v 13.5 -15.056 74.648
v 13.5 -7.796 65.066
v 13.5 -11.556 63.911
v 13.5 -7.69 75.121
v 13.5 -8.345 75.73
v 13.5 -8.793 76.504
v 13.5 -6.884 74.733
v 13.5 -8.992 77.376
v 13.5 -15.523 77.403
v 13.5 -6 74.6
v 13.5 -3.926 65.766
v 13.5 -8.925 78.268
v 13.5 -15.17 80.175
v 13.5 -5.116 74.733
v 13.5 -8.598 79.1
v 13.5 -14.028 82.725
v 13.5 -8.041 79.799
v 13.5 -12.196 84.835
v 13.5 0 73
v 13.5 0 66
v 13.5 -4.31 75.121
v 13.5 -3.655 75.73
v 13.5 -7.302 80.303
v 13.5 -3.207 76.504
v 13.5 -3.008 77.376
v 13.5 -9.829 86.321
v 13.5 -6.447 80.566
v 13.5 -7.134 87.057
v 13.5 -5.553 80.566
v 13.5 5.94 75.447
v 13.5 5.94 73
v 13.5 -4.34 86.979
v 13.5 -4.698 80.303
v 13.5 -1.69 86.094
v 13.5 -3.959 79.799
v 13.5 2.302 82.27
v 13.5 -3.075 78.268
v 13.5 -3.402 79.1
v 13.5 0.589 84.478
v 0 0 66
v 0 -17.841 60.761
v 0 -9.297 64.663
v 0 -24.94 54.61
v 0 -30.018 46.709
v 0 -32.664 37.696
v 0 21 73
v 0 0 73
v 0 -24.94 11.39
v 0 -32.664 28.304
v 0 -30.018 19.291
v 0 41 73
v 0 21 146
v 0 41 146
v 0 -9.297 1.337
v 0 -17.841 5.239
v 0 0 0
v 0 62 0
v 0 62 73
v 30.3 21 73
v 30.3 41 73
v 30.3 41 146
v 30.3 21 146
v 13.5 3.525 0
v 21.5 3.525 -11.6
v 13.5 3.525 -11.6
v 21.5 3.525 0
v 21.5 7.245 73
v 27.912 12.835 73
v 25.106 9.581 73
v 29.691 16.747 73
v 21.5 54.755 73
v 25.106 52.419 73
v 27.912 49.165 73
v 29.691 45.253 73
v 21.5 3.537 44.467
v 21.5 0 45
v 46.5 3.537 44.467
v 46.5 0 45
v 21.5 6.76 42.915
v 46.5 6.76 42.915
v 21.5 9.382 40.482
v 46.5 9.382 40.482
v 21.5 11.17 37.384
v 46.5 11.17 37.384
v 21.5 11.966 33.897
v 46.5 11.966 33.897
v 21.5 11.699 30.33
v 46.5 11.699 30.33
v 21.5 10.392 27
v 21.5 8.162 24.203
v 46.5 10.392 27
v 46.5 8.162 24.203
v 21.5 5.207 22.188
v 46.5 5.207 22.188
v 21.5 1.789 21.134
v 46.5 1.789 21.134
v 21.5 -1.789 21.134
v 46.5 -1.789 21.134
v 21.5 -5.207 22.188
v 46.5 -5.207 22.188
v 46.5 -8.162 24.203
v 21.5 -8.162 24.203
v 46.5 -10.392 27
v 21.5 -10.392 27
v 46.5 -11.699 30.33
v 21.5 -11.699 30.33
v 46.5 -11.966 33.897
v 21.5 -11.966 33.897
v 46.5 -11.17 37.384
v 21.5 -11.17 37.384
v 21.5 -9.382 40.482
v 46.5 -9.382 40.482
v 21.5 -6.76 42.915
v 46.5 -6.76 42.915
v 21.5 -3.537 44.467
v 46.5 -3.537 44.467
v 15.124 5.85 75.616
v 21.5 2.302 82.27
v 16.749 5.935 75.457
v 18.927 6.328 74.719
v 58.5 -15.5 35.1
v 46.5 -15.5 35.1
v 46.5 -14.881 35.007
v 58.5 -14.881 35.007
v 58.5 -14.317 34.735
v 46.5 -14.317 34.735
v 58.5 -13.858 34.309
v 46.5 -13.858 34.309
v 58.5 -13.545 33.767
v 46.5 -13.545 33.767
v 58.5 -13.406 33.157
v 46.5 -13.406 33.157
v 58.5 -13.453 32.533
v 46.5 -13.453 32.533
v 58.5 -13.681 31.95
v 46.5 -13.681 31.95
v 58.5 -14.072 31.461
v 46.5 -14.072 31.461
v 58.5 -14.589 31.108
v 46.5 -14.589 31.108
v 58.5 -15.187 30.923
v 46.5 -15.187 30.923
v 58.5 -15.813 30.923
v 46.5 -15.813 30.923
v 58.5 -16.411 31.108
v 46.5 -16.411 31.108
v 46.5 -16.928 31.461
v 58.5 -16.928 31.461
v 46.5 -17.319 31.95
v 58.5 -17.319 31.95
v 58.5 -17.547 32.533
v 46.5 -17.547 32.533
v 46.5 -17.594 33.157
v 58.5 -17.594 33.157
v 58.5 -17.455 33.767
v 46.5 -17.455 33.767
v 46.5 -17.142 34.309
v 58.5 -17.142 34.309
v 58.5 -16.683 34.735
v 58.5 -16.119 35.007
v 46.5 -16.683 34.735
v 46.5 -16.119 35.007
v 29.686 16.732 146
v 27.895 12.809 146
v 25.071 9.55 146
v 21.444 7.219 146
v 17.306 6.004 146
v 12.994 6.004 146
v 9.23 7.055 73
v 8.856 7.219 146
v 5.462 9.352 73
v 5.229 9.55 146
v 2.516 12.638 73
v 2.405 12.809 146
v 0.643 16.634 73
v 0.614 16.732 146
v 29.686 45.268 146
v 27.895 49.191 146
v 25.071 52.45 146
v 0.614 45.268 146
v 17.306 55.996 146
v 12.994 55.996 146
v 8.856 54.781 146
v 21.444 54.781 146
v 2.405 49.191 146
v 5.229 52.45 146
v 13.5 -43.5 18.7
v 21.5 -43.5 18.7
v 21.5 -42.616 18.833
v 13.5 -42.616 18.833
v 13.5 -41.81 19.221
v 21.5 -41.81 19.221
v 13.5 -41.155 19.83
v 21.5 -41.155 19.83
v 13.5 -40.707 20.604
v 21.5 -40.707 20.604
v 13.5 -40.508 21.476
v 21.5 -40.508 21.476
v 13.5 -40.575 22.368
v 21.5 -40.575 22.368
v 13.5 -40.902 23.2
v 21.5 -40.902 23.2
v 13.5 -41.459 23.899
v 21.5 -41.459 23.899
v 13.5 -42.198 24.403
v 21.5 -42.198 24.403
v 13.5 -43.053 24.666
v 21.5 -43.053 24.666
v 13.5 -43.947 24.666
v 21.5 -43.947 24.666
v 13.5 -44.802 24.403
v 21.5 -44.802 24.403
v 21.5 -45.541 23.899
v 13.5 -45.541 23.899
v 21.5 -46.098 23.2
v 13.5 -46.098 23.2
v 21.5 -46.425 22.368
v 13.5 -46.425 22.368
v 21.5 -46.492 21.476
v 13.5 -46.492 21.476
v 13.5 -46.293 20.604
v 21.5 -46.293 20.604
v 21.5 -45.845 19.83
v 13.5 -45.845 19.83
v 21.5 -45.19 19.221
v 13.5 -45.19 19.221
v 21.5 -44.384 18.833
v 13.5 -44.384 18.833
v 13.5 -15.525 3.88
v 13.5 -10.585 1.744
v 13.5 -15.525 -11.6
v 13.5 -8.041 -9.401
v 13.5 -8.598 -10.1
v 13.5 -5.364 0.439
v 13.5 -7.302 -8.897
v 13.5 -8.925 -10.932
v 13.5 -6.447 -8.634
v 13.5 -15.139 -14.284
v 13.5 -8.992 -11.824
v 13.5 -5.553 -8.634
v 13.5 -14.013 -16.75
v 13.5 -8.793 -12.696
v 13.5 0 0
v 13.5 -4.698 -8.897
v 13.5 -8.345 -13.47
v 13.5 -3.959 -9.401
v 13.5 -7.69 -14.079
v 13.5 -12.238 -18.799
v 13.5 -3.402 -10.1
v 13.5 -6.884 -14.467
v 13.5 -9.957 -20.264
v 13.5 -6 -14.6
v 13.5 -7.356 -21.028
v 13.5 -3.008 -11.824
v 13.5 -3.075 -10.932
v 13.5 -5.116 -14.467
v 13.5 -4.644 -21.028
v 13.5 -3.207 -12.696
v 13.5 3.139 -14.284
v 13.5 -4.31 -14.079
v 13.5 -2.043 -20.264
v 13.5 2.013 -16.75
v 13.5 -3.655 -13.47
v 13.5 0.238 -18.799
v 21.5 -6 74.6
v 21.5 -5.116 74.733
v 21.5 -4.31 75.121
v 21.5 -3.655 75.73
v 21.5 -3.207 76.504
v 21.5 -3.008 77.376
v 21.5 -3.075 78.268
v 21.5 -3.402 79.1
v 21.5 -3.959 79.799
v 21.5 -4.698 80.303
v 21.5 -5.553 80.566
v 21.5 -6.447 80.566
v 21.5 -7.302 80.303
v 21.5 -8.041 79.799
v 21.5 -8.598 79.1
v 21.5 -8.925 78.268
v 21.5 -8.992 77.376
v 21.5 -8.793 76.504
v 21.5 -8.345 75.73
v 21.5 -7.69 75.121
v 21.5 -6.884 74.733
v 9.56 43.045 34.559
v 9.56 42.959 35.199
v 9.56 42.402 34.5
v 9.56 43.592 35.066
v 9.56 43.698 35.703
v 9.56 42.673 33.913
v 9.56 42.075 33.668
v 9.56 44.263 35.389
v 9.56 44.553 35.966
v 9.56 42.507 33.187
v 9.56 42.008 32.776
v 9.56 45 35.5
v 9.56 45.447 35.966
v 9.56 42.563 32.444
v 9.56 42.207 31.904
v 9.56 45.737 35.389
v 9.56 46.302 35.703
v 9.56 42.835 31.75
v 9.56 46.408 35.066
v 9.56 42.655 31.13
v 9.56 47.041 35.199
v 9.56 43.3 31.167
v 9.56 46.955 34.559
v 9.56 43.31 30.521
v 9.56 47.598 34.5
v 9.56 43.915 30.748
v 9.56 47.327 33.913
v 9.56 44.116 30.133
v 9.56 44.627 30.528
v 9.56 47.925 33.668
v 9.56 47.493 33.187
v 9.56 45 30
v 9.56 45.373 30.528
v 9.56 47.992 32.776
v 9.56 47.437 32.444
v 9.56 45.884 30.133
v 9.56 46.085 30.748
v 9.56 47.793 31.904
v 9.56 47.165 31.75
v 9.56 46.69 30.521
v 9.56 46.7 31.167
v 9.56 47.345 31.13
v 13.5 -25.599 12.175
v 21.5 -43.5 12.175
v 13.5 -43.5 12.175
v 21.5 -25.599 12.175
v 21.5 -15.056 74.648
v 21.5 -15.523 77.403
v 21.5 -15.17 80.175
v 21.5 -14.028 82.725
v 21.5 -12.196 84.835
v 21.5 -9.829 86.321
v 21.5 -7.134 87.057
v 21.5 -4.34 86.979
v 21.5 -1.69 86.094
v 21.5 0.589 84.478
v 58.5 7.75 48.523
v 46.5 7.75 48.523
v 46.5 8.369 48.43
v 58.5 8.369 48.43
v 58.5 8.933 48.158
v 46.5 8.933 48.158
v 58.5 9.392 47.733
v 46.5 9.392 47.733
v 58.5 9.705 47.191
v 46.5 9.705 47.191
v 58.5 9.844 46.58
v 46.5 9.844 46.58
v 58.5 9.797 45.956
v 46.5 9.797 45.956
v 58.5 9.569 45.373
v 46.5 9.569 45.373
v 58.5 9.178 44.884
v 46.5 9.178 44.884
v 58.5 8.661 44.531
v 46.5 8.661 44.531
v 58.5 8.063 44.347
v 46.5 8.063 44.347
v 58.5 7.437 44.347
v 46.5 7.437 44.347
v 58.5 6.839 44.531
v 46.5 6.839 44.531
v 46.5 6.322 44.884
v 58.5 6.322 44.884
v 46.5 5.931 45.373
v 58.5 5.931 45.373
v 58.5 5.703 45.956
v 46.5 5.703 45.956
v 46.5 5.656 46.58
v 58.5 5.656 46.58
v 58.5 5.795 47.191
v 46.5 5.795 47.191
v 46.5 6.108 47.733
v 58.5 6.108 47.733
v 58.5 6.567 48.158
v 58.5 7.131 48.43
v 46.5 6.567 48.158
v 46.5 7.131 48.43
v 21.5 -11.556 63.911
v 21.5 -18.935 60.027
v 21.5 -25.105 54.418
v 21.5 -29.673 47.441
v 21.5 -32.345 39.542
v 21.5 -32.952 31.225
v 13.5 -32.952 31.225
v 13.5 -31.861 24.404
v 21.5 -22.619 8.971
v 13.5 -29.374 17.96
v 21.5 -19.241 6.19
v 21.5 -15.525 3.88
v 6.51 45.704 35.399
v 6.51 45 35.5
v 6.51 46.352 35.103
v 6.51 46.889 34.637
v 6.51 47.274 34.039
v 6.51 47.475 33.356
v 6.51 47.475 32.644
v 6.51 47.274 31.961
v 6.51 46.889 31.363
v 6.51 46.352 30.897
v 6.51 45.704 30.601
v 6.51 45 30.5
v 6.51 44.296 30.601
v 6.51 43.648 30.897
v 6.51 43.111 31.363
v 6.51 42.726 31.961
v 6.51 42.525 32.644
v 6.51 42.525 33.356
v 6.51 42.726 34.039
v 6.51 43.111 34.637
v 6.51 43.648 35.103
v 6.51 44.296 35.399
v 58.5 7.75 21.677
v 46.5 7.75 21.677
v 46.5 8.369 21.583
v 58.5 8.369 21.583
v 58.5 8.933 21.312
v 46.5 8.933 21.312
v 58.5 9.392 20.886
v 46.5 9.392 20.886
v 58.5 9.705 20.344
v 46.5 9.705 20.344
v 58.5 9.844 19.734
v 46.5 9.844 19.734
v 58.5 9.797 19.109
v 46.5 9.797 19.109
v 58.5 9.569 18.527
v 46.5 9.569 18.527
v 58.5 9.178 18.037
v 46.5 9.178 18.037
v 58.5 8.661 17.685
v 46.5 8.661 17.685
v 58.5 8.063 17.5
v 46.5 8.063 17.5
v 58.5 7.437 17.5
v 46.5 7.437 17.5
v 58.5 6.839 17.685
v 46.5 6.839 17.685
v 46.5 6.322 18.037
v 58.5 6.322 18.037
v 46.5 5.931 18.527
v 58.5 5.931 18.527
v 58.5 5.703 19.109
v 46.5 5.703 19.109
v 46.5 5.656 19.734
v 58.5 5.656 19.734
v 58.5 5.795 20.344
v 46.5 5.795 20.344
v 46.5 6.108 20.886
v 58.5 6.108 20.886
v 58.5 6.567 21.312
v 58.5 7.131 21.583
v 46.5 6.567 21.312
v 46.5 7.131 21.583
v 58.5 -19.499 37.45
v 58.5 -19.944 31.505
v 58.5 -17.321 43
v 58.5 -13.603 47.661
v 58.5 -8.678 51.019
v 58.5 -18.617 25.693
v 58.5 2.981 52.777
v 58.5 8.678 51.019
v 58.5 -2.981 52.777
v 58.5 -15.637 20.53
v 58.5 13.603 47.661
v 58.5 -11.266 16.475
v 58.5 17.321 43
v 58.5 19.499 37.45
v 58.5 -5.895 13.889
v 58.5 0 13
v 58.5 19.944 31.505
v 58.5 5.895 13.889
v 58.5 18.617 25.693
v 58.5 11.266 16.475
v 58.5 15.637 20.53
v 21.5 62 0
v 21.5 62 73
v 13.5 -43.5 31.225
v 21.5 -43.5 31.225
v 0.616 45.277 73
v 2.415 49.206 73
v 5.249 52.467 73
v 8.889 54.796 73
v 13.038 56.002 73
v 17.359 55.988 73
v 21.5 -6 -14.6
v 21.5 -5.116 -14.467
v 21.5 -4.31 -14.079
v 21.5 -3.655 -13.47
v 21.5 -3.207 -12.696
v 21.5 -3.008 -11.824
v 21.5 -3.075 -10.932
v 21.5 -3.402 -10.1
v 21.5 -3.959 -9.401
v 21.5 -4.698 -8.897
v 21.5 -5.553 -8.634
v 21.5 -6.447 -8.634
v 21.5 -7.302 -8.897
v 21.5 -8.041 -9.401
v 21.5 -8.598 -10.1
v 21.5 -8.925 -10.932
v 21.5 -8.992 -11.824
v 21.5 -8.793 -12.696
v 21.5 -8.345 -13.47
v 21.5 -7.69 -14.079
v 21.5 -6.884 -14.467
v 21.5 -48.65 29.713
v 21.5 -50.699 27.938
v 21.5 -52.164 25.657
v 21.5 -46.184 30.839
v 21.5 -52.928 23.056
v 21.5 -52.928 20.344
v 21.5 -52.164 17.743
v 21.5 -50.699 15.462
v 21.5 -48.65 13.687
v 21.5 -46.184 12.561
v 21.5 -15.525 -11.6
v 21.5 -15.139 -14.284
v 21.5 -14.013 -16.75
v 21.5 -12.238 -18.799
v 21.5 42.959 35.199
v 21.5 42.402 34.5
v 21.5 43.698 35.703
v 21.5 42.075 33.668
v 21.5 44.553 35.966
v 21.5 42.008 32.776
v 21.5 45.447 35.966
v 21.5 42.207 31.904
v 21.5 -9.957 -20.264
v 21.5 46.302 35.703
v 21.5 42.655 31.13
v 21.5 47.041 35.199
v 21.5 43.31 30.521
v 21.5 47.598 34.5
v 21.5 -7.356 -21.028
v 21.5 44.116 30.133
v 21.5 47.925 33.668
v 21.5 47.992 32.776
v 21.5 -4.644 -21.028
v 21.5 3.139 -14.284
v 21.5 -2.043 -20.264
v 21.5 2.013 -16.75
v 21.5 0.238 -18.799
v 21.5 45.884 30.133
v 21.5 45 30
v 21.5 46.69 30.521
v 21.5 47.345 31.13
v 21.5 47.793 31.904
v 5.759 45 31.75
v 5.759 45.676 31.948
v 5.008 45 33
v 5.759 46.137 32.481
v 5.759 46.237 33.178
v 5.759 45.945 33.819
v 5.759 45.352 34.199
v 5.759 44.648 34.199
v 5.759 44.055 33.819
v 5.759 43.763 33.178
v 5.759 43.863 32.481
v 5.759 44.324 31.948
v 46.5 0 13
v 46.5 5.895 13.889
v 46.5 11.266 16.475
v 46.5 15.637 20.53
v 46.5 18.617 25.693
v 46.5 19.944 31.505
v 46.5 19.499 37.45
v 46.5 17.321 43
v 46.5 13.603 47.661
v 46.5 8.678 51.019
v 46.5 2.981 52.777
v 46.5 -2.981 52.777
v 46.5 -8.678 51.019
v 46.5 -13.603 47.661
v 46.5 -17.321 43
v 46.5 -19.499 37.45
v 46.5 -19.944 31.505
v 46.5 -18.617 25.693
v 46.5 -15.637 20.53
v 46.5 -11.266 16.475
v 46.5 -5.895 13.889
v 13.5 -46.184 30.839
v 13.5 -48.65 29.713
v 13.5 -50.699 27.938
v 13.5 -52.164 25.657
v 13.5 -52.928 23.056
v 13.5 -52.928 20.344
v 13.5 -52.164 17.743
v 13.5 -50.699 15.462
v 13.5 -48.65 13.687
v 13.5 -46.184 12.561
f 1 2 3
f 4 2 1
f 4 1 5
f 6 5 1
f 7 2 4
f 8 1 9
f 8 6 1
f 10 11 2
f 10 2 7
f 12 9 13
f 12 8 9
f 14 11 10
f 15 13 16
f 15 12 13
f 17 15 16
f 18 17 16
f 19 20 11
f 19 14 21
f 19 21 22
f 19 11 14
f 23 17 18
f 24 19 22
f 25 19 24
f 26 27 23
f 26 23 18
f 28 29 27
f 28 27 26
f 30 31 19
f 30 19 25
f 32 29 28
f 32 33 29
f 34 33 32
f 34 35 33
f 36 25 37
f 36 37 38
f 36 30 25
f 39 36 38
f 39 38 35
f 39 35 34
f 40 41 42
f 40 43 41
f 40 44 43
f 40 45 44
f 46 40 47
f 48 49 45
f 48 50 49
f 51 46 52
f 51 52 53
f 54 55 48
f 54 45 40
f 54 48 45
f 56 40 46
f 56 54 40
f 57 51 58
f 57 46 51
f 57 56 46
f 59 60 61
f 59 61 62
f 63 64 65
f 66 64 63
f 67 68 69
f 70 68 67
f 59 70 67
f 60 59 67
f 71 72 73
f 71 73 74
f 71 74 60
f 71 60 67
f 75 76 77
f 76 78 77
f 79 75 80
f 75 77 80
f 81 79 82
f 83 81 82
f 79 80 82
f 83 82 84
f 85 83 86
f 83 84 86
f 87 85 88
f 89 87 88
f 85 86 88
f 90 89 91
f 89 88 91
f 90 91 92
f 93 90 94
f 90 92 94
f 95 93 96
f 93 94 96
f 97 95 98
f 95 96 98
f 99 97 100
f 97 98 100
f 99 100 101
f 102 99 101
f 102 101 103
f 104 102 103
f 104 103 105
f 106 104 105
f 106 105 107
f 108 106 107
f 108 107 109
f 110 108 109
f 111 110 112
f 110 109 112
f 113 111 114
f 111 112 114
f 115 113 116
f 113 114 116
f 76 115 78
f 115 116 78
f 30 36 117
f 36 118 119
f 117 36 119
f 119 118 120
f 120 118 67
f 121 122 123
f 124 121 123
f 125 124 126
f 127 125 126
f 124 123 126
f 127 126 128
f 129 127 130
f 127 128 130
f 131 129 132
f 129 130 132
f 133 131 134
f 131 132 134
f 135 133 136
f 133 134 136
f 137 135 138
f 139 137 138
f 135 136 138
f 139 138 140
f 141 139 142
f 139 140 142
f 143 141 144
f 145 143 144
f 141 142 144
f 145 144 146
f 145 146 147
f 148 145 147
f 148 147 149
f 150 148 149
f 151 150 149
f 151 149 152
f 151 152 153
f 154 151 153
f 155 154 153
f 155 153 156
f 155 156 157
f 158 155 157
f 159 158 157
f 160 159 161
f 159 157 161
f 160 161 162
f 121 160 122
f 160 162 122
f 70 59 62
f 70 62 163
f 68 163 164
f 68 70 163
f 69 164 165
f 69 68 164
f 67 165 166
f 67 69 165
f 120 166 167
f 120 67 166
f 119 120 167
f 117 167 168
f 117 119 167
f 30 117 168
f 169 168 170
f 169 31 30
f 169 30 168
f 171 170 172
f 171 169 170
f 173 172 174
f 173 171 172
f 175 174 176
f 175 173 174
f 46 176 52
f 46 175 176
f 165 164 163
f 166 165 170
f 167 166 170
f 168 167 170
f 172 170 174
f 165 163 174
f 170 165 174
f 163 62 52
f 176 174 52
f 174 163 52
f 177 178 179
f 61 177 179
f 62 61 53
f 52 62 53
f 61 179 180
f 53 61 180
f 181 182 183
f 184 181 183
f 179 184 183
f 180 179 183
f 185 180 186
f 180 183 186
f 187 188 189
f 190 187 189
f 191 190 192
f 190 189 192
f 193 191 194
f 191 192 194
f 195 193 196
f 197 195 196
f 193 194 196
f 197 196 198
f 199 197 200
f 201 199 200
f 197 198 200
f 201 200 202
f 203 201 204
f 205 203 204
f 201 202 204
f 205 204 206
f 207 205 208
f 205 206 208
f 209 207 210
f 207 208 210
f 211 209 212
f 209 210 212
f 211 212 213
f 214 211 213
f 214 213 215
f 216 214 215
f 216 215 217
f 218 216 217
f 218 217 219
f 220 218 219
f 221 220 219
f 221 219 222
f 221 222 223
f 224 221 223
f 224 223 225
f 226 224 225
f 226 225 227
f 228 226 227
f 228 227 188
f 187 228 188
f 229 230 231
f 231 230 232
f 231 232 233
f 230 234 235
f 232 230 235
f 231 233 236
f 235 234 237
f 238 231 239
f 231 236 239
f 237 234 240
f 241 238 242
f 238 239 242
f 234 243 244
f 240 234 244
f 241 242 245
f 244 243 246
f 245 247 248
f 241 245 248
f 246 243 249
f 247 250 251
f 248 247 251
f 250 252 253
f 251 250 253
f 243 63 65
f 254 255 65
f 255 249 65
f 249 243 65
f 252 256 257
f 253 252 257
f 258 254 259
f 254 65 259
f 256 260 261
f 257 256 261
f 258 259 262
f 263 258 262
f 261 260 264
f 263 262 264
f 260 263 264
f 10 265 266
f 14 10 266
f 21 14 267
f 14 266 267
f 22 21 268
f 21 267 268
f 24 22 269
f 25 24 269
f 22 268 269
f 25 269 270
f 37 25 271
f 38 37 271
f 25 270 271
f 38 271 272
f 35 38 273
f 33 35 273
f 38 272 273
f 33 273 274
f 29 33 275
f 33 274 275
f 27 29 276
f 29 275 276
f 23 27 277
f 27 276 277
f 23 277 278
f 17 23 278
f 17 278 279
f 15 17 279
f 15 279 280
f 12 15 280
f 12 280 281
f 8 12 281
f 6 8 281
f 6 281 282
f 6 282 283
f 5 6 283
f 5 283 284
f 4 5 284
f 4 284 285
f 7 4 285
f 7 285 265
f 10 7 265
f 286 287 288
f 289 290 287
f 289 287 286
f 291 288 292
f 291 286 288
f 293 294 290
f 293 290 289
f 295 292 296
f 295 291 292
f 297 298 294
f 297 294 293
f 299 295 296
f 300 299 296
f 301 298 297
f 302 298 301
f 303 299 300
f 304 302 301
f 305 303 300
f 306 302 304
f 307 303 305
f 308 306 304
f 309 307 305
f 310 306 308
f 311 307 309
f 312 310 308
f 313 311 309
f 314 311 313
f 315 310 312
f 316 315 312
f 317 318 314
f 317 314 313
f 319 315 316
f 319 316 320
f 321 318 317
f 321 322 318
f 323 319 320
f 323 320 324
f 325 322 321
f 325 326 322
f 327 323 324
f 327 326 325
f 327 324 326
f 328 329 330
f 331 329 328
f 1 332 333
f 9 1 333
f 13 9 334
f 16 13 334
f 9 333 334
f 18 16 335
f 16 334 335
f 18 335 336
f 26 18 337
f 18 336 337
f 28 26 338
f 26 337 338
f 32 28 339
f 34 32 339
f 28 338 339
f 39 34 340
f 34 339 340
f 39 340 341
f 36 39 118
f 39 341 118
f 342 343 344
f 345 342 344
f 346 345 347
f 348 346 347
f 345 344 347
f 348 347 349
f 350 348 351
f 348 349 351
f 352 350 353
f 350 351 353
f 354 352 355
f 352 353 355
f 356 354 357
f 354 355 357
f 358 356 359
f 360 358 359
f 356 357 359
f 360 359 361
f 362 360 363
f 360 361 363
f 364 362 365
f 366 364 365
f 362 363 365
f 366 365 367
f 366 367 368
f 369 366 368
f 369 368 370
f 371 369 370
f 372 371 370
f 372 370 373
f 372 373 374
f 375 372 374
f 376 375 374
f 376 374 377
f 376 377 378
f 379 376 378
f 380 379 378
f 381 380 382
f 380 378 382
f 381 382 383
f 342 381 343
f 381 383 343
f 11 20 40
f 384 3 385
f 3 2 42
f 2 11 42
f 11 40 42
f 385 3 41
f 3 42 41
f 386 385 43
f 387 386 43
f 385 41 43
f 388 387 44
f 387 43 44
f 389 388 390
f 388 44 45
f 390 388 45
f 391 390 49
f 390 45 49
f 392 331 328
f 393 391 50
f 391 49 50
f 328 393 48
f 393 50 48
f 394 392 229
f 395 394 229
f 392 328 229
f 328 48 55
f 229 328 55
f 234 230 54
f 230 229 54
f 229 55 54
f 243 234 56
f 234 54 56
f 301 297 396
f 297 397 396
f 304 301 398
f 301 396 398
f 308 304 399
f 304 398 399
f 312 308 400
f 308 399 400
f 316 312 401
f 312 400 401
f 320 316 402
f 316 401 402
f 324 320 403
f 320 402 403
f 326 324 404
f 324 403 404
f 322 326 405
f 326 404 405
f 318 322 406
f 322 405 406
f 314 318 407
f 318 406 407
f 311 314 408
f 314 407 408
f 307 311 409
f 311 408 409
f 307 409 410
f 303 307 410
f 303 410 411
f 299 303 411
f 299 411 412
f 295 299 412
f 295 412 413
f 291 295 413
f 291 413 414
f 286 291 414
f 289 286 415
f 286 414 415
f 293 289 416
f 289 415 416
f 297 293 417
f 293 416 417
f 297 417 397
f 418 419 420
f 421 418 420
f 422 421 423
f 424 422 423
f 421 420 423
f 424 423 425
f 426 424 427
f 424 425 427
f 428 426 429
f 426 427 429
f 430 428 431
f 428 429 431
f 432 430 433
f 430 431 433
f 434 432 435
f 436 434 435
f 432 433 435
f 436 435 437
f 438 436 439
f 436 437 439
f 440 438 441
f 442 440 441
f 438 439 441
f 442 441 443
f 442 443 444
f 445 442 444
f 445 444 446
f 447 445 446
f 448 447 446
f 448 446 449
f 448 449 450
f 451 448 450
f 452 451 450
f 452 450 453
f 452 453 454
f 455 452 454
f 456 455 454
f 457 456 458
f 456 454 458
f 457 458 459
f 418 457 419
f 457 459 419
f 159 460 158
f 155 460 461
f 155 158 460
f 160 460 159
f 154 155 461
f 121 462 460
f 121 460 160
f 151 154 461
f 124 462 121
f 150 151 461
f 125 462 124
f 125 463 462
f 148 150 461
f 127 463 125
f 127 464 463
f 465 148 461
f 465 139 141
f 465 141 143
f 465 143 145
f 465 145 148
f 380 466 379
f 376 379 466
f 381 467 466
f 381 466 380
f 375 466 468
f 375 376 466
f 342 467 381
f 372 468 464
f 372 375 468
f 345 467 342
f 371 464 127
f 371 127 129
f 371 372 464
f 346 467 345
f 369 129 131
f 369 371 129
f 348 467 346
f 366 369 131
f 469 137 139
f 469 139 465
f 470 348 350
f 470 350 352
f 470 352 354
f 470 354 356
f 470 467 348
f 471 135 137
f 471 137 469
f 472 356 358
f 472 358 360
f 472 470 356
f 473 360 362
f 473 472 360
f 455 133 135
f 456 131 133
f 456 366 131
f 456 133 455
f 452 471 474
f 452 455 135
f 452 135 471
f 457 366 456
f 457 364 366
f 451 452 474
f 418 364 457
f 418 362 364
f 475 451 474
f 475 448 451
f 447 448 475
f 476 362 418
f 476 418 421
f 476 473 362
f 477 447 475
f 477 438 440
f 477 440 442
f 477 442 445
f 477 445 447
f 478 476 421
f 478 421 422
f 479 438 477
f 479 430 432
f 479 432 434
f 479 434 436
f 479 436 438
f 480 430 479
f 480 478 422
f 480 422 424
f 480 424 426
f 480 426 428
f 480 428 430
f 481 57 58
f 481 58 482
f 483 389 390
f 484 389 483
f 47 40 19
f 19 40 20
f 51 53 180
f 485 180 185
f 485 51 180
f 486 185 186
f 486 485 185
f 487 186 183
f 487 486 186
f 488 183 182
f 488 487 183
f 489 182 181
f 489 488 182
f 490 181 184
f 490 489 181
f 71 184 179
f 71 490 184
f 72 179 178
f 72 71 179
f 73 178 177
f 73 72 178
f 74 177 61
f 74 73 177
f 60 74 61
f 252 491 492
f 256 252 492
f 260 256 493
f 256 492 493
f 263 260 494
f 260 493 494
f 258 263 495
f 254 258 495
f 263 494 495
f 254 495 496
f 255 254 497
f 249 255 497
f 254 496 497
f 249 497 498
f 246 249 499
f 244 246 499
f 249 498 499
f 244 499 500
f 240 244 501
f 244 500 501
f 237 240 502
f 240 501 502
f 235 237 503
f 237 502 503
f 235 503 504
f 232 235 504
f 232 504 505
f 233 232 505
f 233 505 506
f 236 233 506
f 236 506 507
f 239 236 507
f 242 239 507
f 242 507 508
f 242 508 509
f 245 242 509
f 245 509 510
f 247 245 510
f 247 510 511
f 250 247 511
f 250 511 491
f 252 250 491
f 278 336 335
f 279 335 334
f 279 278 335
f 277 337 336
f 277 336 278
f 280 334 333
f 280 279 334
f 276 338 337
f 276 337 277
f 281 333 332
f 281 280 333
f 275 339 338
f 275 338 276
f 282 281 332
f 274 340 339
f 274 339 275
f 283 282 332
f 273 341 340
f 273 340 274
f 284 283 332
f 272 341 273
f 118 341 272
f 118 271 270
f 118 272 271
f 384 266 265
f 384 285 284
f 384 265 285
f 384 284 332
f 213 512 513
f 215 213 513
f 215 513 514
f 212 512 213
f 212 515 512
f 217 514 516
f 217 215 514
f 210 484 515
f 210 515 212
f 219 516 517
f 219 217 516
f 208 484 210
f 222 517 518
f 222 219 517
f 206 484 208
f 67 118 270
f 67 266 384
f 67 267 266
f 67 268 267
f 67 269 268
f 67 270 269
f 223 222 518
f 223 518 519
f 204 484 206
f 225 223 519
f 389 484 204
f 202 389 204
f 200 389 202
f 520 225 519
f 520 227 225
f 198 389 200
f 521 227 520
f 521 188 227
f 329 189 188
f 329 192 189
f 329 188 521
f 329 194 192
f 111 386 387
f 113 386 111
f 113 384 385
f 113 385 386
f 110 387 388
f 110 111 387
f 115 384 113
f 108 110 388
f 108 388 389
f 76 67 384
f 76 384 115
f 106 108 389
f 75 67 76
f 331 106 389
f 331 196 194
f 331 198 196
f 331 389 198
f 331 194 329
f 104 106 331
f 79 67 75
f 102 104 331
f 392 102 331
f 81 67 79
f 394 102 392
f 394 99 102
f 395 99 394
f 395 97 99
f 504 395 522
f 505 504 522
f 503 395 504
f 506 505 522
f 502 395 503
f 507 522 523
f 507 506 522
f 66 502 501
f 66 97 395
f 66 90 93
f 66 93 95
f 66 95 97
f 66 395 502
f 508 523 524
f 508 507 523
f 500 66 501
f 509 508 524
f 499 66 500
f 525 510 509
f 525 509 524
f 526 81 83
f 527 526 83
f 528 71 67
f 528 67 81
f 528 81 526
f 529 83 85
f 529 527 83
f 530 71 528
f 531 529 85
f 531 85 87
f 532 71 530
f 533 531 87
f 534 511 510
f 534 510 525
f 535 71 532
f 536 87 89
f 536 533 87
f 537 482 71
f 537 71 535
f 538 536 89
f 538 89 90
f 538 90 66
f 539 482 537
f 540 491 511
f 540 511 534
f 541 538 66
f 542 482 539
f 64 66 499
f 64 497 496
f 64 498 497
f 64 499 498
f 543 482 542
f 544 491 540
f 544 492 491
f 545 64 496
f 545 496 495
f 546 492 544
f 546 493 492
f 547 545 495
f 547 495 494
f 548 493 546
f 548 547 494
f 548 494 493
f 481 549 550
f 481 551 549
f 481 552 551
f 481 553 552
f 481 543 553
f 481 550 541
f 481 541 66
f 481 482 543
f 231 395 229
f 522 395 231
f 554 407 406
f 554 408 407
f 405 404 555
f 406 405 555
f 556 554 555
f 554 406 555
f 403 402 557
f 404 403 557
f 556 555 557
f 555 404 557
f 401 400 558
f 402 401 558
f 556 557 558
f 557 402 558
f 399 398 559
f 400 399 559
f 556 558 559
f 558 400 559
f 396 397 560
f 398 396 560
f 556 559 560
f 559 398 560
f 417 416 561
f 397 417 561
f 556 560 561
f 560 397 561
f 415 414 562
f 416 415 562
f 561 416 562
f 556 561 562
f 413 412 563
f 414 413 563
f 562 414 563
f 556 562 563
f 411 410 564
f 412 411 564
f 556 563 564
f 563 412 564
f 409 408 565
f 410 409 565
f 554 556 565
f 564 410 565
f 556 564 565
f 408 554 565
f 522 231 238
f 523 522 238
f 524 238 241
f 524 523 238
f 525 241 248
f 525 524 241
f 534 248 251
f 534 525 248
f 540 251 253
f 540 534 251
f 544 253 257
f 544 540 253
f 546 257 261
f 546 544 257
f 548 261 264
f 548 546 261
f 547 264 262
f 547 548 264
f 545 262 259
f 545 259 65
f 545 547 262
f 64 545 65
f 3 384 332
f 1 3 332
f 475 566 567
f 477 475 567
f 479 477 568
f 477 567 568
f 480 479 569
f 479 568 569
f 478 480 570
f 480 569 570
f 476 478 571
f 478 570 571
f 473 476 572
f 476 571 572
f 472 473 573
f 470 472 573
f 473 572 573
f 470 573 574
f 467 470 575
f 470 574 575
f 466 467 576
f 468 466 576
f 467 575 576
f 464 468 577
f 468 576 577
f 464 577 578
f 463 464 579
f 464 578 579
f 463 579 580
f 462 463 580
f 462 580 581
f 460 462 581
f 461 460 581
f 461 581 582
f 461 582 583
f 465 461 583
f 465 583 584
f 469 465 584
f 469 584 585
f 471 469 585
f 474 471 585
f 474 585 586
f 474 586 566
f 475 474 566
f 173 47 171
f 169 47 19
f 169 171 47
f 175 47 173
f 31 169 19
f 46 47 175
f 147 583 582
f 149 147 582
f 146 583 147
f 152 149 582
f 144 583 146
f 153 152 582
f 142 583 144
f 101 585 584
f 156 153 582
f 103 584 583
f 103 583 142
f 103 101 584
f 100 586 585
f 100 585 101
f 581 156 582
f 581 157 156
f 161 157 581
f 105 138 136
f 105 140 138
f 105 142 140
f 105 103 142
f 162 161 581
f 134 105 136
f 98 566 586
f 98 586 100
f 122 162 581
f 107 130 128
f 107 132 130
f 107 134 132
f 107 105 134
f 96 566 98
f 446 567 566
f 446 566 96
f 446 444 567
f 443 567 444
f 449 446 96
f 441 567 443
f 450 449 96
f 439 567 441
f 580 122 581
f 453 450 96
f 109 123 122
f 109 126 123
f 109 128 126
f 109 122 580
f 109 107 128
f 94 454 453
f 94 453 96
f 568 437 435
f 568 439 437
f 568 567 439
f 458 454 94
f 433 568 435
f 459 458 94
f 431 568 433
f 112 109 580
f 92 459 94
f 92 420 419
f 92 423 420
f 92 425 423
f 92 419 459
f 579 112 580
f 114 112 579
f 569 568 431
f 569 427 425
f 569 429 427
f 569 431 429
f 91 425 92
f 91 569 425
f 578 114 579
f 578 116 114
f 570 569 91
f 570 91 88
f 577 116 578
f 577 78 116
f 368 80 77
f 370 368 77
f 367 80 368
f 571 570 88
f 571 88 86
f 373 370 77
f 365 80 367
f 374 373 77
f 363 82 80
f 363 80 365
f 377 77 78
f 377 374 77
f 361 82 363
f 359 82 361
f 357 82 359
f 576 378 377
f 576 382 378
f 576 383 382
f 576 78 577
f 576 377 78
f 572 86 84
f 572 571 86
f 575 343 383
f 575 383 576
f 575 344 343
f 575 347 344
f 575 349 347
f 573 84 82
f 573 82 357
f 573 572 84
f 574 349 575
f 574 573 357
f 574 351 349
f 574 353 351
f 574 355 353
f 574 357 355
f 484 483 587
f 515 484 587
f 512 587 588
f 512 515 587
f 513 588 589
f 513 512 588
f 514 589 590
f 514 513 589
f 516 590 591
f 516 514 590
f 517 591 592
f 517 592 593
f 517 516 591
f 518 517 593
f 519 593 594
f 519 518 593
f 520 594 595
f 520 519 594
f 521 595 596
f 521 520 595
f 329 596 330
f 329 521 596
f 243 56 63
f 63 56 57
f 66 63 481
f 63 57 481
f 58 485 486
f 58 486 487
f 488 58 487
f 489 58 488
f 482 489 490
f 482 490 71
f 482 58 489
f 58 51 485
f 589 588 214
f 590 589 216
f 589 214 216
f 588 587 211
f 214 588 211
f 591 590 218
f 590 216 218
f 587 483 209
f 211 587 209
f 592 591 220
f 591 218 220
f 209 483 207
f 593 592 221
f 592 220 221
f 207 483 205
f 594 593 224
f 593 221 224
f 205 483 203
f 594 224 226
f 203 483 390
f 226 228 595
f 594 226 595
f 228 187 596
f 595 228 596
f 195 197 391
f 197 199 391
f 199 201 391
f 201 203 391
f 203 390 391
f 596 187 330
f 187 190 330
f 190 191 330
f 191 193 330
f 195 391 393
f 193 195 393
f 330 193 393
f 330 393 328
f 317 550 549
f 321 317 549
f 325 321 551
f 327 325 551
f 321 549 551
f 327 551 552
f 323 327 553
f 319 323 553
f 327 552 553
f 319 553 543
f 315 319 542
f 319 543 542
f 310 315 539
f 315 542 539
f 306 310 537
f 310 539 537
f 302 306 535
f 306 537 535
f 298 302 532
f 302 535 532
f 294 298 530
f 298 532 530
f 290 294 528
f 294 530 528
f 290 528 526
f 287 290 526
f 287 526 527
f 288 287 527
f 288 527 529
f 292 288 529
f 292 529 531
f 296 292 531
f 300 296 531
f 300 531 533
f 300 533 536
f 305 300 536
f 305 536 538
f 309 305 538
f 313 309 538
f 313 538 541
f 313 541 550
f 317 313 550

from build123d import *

# Parameters (mm, degrees)
SKETCH1_R                       = 33
BOSS_EXTRUDE1_DEPTH             = 21.5
SKETCH4_R                       = 20
BOSS_EXTRUDE4_DEPTH             = 37
SKETCH6_W                       = 21.5
SKETCH6_H                       = 62
BOSS_EXTRUDE5_DEPTH             = 73
BOSS_EXTRUDE6_DEPTH             = 73
BOSS_EXTRUDE7_DEPTH             = 8
M6X1_0_TAPPED_HOLE1_D           = 5
M6X1_0_TAPPED_HOLE1_DEPTH       = 14.99
M6X1_0_TAPPED_HOLE1_CBORE_D     = 6
M6X1_0_TAPPED_HOLE1_CBORE_DEPTH = 11.94
M6X1_0_TAPPED_HOLE1_TIP         = 1.502151548
M5X0_8_TAPPED_HOLE1_D           = 4.2
M5X0_8_TAPPED_HOLE1_DEPTH       = 12.192
M5X0_8_TAPPED_HOLE1_TIP         = 1.2618073
SKETCH14_W                      = 25
SKETCH14_H                      = 8


with BuildPart() as part:
    # Sketch1 → Boss-Extrude1 (new body)
    with BuildSketch(Plane(origin=(0, 0, 0), x_dir=(0, 0, -1), z_dir=(1, 0, 0))):
        with Locations((-33, 0)):
            Circle(SKETCH1_R)
    extrude(amount=BOSS_EXTRUDE1_DEPTH)

    # Sketch4 → Boss-Extrude4 (add)
    with BuildSketch(Plane(origin=(21.5, 0, 0), x_dir=(0, 0, -1), z_dir=(1, 0, 0))):
        with Locations((-33, 0)):
            Circle(SKETCH4_R)
    extrude(amount=BOSS_EXTRUDE4_DEPTH)

    # Sketch6 → Boss-Extrude5 (add)
    with BuildSketch(Plane.XY):
        with Locations((10.75, 31)):
            Rectangle(SKETCH6_W, SKETCH6_H)
    extrude(amount=BOSS_EXTRUDE5_DEPTH)

    # Sketch7 → Boss-Extrude6 (add)
    with BuildSketch(Plane.XY.offset(73)):
        with BuildLine():
            Line((30.3, 41), (30.3, 21))
            ThreePointArc((30.3, 21), (15.15, 5.85), (0, 21))
            Line((0, 21), (0, 41))
            ThreePointArc((0, 41), (15.15, 56.15), (30.3, 41))
        make_face()
    extrude(amount=BOSS_EXTRUDE6_DEPTH)

    # Sketch9 → Boss-Extrude7 (add)
    with BuildSketch(Plane(origin=(21.5, 0, 0), x_dir=(0, 0, -1), z_dir=(1, 0, 0))):
        with BuildLine():
            Line((11.6, 3.525), (0, 3.525))
            Line((0, 3.525), (-3.880000429, -15.525))
            Line((-3.880000429, -15.525), (11.6, -15.525))
            ThreePointArc((11.6, -15.525), (21.125, -6), (11.6, 3.525))
        make_face()
        with BuildLine():
            Line((-12.175, -43.5), (-12.175, -25.599206531))
            Line((-12.175, -25.599206531), (-31.225, -32.95222868))
            Line((-31.225, -32.95222868), (-31.225, -43.5))
            ThreePointArc((-31.225, -43.5), (-21.7, -53.025), (-12.175, -43.5))
        make_face()
        with BuildLine():
            Line((-82.269569588, 2.301851893), (-73, 7.245000909))
            Line((-73, 7.245000909), (-63.910592017, 7.245000909))
            Line((-63.910592017, 7.245000909), (-63.910592017, -11.555747537))
            Line((-63.910592017, -11.555747537), (-74.647866464, -15.055966684))
            ThreePointArc((-74.647866464, -15.055966684), (-86.321287926, -9.829459741), (-82.269569588, 2.301851893))
        make_face()
    extrude(amount=-BOSS_EXTRUDE7_DEPTH)

    # M6x1.0 Tapped Hole1
    with Locations(Plane(origin=(21.5, 0, 0), x_dir=(0, 0, -1), z_dir=(1, 0, 0))):
        with Locations((-33, 45), (11.6, -6), (-21.7, -43.5), (-77.6, -6)):
            CounterBoreHole(M6X1_0_TAPPED_HOLE1_D / 2, M6X1_0_TAPPED_HOLE1_CBORE_D / 2, M6X1_0_TAPPED_HOLE1_CBORE_DEPTH, depth=M6X1_0_TAPPED_HOLE1_DEPTH)
            with Locations((0, 0, -(M6X1_0_TAPPED_HOLE1_DEPTH + M6X1_0_TAPPED_HOLE1_TIP / 2))):  # 118° drill point
                Cone(0, M6X1_0_TAPPED_HOLE1_D / 2, M6X1_0_TAPPED_HOLE1_TIP, mode=Mode.SUBTRACT)

    # M5x0.8 Tapped Hole1
    with Locations(Plane(origin=(58.5, 0, 0), x_dir=(0, 0, -1), z_dir=(1, 0, 0))):
        with Locations((-19.576606241, 7.75), (-33, -15.5), (-46.423393759, 7.75)):
            Hole(M5X0_8_TAPPED_HOLE1_D / 2, depth=M5X0_8_TAPPED_HOLE1_DEPTH)
            with Locations((0, 0, -(M5X0_8_TAPPED_HOLE1_DEPTH + M5X0_8_TAPPED_HOLE1_TIP / 2))):  # 118° drill point
                Cone(0, M5X0_8_TAPPED_HOLE1_D / 2, M5X0_8_TAPPED_HOLE1_TIP, mode=Mode.SUBTRACT)

    # Sketch14 → Cut-Revolve1 (revolve, cut)
    with BuildSketch(Plane(origin=(0, 0, 0), x_dir=(1, 0, 0), z_dir=(0, 1, 0))):
        with Locations((34, -49)):
            Rectangle(SKETCH14_W, SKETCH14_H)
    revolve(axis=Axis((58.5, 0, 33), (-1, 0, 0)), mode=Mode.SUBTRACT)


solid = part.part
